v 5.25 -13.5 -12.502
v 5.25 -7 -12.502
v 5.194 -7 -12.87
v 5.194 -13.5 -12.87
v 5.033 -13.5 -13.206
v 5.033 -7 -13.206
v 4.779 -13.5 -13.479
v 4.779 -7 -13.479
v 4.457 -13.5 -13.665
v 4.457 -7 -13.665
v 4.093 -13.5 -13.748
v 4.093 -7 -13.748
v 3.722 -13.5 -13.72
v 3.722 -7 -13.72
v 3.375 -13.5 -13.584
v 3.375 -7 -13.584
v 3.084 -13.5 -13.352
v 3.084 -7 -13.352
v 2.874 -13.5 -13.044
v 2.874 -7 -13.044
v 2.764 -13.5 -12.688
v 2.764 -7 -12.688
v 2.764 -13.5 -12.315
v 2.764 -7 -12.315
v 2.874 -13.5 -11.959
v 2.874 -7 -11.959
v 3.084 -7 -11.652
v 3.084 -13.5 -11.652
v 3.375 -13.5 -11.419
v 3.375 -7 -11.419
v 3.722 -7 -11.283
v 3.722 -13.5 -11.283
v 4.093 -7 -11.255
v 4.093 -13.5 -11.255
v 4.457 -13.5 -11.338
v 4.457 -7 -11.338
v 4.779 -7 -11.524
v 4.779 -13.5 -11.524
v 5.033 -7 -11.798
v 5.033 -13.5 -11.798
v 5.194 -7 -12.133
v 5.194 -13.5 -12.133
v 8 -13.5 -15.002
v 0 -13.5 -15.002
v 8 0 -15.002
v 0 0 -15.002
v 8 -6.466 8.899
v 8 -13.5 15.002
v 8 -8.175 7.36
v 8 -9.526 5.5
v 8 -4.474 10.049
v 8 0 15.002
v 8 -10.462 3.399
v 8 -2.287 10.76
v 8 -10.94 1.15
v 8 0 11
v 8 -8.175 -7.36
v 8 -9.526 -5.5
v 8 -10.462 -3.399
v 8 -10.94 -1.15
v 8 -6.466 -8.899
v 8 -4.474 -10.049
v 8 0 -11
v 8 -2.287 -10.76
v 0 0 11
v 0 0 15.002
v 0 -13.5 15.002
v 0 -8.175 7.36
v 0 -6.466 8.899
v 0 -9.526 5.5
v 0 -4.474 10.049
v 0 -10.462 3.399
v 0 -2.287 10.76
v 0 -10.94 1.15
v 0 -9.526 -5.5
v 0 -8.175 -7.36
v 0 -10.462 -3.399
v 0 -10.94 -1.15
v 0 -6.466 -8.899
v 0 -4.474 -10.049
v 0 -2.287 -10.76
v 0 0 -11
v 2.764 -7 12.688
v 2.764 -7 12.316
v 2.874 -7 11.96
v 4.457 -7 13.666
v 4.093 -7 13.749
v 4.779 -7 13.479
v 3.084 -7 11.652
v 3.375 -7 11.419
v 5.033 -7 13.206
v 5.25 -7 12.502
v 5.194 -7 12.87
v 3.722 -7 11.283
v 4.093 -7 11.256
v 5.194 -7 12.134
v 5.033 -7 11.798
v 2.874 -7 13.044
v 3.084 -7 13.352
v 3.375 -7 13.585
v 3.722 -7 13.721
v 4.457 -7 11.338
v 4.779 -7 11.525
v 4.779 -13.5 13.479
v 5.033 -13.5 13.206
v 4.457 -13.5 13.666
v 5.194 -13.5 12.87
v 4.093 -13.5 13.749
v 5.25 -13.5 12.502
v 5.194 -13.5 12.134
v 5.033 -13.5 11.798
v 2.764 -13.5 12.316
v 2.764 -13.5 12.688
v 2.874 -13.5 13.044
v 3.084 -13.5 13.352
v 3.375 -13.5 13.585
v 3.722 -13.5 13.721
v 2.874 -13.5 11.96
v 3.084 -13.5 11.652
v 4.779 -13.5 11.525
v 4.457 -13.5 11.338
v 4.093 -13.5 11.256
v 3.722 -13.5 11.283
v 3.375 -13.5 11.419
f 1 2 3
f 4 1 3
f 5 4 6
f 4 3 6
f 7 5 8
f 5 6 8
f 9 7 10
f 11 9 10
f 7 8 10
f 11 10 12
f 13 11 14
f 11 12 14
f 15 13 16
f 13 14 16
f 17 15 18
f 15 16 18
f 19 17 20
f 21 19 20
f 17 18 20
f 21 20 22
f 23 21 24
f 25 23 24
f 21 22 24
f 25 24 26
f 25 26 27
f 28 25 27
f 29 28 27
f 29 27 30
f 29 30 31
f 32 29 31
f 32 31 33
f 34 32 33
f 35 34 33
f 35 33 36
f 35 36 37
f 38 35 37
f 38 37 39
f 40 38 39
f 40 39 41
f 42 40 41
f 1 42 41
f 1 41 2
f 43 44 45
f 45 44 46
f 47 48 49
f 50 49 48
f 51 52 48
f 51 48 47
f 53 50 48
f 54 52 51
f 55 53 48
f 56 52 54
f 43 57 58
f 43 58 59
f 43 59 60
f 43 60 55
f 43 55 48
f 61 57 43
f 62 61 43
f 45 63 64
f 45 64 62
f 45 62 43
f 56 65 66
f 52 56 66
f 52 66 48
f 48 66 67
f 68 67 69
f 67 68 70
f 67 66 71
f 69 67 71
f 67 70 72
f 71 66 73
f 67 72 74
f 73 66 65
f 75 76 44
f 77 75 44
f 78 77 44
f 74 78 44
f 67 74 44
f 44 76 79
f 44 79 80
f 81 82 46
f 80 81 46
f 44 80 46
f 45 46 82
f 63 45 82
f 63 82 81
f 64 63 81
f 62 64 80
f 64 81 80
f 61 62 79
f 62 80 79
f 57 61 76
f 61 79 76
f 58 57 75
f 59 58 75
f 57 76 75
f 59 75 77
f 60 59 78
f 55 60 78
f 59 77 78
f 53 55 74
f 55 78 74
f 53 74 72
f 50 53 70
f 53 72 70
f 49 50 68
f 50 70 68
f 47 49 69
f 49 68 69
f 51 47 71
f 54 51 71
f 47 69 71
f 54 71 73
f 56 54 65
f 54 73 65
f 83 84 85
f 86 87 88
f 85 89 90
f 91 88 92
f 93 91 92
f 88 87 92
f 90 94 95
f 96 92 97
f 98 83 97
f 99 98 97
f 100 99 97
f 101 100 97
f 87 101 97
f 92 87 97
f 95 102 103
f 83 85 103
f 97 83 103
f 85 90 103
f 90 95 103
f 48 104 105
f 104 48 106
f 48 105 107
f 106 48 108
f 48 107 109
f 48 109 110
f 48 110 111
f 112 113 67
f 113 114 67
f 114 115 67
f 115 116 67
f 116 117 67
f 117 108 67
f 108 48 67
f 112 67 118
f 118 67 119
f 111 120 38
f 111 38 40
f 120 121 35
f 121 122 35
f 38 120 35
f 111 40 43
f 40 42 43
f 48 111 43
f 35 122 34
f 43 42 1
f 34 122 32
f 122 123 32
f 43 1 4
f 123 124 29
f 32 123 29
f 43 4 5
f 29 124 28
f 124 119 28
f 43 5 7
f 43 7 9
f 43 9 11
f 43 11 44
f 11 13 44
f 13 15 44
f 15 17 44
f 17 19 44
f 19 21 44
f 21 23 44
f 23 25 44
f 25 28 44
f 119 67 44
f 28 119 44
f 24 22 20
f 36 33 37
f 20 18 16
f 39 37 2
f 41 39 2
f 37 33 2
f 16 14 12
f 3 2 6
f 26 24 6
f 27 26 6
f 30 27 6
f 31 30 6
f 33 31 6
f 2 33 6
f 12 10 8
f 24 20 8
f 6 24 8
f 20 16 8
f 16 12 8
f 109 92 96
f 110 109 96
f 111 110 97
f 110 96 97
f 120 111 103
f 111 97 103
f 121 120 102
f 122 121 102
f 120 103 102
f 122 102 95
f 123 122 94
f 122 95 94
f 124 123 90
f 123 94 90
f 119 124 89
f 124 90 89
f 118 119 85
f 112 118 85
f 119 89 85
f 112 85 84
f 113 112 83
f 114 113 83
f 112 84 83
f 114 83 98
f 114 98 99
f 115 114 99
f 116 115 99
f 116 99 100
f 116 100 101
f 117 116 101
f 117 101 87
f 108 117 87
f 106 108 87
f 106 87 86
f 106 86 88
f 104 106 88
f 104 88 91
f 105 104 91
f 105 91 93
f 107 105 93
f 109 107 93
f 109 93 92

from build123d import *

# Parameters (mm, degrees)
BOSS_EXTRUDE1_DEPTH                = 8
TAP_DRILL_FOR_M2_5X0_45_TAP1_D     = 2.5
TAP_DRILL_FOR_M2_5X0_45_TAP1_DEPTH = 6.5


with BuildPart() as part:
    # Sketch1 → Boss-Extrude1 (new body)
    with BuildSketch(Plane(origin=(0, 0, 0), x_dir=(0, 0, -1), z_dir=(1, 0, 0))):
        with BuildLine():
            Line((-11.002014748, 0), (-15.002014748, 0))
            Line((-15.002014748, 0), (-15.002014748, -13.5))
            Line((-15.002014748, -13.5), (15.001777911, -13.5))
            Line((15.001777911, -13.5), (15.001777911, 0))
            Line((15.001777911, 0), (11.001777911, 0))
            Line((11.001777911, 0), (11, 0))
            ThreePointArc((11, 0), (0, -11), (-11, 0))
            Line((-11, 0), (-11.002014748, 0))
        make_face()
    extrude(amount=BOSS_EXTRUDE1_DEPTH)

    # Tap Drill for M2.5x0.45 Tap1
    with Locations(Plane(origin=(0, -13.5, 0), x_dir=(-1, 0, 0), z_dir=(0, -1, 0))):
        with Locations((-4, -12.502014748), (-4, 12.501777911)):
            Hole(TAP_DRILL_FOR_M2_5X0_45_TAP1_D / 2, depth=TAP_DRILL_FOR_M2_5X0_45_TAP1_DEPTH)


solid = part.part
